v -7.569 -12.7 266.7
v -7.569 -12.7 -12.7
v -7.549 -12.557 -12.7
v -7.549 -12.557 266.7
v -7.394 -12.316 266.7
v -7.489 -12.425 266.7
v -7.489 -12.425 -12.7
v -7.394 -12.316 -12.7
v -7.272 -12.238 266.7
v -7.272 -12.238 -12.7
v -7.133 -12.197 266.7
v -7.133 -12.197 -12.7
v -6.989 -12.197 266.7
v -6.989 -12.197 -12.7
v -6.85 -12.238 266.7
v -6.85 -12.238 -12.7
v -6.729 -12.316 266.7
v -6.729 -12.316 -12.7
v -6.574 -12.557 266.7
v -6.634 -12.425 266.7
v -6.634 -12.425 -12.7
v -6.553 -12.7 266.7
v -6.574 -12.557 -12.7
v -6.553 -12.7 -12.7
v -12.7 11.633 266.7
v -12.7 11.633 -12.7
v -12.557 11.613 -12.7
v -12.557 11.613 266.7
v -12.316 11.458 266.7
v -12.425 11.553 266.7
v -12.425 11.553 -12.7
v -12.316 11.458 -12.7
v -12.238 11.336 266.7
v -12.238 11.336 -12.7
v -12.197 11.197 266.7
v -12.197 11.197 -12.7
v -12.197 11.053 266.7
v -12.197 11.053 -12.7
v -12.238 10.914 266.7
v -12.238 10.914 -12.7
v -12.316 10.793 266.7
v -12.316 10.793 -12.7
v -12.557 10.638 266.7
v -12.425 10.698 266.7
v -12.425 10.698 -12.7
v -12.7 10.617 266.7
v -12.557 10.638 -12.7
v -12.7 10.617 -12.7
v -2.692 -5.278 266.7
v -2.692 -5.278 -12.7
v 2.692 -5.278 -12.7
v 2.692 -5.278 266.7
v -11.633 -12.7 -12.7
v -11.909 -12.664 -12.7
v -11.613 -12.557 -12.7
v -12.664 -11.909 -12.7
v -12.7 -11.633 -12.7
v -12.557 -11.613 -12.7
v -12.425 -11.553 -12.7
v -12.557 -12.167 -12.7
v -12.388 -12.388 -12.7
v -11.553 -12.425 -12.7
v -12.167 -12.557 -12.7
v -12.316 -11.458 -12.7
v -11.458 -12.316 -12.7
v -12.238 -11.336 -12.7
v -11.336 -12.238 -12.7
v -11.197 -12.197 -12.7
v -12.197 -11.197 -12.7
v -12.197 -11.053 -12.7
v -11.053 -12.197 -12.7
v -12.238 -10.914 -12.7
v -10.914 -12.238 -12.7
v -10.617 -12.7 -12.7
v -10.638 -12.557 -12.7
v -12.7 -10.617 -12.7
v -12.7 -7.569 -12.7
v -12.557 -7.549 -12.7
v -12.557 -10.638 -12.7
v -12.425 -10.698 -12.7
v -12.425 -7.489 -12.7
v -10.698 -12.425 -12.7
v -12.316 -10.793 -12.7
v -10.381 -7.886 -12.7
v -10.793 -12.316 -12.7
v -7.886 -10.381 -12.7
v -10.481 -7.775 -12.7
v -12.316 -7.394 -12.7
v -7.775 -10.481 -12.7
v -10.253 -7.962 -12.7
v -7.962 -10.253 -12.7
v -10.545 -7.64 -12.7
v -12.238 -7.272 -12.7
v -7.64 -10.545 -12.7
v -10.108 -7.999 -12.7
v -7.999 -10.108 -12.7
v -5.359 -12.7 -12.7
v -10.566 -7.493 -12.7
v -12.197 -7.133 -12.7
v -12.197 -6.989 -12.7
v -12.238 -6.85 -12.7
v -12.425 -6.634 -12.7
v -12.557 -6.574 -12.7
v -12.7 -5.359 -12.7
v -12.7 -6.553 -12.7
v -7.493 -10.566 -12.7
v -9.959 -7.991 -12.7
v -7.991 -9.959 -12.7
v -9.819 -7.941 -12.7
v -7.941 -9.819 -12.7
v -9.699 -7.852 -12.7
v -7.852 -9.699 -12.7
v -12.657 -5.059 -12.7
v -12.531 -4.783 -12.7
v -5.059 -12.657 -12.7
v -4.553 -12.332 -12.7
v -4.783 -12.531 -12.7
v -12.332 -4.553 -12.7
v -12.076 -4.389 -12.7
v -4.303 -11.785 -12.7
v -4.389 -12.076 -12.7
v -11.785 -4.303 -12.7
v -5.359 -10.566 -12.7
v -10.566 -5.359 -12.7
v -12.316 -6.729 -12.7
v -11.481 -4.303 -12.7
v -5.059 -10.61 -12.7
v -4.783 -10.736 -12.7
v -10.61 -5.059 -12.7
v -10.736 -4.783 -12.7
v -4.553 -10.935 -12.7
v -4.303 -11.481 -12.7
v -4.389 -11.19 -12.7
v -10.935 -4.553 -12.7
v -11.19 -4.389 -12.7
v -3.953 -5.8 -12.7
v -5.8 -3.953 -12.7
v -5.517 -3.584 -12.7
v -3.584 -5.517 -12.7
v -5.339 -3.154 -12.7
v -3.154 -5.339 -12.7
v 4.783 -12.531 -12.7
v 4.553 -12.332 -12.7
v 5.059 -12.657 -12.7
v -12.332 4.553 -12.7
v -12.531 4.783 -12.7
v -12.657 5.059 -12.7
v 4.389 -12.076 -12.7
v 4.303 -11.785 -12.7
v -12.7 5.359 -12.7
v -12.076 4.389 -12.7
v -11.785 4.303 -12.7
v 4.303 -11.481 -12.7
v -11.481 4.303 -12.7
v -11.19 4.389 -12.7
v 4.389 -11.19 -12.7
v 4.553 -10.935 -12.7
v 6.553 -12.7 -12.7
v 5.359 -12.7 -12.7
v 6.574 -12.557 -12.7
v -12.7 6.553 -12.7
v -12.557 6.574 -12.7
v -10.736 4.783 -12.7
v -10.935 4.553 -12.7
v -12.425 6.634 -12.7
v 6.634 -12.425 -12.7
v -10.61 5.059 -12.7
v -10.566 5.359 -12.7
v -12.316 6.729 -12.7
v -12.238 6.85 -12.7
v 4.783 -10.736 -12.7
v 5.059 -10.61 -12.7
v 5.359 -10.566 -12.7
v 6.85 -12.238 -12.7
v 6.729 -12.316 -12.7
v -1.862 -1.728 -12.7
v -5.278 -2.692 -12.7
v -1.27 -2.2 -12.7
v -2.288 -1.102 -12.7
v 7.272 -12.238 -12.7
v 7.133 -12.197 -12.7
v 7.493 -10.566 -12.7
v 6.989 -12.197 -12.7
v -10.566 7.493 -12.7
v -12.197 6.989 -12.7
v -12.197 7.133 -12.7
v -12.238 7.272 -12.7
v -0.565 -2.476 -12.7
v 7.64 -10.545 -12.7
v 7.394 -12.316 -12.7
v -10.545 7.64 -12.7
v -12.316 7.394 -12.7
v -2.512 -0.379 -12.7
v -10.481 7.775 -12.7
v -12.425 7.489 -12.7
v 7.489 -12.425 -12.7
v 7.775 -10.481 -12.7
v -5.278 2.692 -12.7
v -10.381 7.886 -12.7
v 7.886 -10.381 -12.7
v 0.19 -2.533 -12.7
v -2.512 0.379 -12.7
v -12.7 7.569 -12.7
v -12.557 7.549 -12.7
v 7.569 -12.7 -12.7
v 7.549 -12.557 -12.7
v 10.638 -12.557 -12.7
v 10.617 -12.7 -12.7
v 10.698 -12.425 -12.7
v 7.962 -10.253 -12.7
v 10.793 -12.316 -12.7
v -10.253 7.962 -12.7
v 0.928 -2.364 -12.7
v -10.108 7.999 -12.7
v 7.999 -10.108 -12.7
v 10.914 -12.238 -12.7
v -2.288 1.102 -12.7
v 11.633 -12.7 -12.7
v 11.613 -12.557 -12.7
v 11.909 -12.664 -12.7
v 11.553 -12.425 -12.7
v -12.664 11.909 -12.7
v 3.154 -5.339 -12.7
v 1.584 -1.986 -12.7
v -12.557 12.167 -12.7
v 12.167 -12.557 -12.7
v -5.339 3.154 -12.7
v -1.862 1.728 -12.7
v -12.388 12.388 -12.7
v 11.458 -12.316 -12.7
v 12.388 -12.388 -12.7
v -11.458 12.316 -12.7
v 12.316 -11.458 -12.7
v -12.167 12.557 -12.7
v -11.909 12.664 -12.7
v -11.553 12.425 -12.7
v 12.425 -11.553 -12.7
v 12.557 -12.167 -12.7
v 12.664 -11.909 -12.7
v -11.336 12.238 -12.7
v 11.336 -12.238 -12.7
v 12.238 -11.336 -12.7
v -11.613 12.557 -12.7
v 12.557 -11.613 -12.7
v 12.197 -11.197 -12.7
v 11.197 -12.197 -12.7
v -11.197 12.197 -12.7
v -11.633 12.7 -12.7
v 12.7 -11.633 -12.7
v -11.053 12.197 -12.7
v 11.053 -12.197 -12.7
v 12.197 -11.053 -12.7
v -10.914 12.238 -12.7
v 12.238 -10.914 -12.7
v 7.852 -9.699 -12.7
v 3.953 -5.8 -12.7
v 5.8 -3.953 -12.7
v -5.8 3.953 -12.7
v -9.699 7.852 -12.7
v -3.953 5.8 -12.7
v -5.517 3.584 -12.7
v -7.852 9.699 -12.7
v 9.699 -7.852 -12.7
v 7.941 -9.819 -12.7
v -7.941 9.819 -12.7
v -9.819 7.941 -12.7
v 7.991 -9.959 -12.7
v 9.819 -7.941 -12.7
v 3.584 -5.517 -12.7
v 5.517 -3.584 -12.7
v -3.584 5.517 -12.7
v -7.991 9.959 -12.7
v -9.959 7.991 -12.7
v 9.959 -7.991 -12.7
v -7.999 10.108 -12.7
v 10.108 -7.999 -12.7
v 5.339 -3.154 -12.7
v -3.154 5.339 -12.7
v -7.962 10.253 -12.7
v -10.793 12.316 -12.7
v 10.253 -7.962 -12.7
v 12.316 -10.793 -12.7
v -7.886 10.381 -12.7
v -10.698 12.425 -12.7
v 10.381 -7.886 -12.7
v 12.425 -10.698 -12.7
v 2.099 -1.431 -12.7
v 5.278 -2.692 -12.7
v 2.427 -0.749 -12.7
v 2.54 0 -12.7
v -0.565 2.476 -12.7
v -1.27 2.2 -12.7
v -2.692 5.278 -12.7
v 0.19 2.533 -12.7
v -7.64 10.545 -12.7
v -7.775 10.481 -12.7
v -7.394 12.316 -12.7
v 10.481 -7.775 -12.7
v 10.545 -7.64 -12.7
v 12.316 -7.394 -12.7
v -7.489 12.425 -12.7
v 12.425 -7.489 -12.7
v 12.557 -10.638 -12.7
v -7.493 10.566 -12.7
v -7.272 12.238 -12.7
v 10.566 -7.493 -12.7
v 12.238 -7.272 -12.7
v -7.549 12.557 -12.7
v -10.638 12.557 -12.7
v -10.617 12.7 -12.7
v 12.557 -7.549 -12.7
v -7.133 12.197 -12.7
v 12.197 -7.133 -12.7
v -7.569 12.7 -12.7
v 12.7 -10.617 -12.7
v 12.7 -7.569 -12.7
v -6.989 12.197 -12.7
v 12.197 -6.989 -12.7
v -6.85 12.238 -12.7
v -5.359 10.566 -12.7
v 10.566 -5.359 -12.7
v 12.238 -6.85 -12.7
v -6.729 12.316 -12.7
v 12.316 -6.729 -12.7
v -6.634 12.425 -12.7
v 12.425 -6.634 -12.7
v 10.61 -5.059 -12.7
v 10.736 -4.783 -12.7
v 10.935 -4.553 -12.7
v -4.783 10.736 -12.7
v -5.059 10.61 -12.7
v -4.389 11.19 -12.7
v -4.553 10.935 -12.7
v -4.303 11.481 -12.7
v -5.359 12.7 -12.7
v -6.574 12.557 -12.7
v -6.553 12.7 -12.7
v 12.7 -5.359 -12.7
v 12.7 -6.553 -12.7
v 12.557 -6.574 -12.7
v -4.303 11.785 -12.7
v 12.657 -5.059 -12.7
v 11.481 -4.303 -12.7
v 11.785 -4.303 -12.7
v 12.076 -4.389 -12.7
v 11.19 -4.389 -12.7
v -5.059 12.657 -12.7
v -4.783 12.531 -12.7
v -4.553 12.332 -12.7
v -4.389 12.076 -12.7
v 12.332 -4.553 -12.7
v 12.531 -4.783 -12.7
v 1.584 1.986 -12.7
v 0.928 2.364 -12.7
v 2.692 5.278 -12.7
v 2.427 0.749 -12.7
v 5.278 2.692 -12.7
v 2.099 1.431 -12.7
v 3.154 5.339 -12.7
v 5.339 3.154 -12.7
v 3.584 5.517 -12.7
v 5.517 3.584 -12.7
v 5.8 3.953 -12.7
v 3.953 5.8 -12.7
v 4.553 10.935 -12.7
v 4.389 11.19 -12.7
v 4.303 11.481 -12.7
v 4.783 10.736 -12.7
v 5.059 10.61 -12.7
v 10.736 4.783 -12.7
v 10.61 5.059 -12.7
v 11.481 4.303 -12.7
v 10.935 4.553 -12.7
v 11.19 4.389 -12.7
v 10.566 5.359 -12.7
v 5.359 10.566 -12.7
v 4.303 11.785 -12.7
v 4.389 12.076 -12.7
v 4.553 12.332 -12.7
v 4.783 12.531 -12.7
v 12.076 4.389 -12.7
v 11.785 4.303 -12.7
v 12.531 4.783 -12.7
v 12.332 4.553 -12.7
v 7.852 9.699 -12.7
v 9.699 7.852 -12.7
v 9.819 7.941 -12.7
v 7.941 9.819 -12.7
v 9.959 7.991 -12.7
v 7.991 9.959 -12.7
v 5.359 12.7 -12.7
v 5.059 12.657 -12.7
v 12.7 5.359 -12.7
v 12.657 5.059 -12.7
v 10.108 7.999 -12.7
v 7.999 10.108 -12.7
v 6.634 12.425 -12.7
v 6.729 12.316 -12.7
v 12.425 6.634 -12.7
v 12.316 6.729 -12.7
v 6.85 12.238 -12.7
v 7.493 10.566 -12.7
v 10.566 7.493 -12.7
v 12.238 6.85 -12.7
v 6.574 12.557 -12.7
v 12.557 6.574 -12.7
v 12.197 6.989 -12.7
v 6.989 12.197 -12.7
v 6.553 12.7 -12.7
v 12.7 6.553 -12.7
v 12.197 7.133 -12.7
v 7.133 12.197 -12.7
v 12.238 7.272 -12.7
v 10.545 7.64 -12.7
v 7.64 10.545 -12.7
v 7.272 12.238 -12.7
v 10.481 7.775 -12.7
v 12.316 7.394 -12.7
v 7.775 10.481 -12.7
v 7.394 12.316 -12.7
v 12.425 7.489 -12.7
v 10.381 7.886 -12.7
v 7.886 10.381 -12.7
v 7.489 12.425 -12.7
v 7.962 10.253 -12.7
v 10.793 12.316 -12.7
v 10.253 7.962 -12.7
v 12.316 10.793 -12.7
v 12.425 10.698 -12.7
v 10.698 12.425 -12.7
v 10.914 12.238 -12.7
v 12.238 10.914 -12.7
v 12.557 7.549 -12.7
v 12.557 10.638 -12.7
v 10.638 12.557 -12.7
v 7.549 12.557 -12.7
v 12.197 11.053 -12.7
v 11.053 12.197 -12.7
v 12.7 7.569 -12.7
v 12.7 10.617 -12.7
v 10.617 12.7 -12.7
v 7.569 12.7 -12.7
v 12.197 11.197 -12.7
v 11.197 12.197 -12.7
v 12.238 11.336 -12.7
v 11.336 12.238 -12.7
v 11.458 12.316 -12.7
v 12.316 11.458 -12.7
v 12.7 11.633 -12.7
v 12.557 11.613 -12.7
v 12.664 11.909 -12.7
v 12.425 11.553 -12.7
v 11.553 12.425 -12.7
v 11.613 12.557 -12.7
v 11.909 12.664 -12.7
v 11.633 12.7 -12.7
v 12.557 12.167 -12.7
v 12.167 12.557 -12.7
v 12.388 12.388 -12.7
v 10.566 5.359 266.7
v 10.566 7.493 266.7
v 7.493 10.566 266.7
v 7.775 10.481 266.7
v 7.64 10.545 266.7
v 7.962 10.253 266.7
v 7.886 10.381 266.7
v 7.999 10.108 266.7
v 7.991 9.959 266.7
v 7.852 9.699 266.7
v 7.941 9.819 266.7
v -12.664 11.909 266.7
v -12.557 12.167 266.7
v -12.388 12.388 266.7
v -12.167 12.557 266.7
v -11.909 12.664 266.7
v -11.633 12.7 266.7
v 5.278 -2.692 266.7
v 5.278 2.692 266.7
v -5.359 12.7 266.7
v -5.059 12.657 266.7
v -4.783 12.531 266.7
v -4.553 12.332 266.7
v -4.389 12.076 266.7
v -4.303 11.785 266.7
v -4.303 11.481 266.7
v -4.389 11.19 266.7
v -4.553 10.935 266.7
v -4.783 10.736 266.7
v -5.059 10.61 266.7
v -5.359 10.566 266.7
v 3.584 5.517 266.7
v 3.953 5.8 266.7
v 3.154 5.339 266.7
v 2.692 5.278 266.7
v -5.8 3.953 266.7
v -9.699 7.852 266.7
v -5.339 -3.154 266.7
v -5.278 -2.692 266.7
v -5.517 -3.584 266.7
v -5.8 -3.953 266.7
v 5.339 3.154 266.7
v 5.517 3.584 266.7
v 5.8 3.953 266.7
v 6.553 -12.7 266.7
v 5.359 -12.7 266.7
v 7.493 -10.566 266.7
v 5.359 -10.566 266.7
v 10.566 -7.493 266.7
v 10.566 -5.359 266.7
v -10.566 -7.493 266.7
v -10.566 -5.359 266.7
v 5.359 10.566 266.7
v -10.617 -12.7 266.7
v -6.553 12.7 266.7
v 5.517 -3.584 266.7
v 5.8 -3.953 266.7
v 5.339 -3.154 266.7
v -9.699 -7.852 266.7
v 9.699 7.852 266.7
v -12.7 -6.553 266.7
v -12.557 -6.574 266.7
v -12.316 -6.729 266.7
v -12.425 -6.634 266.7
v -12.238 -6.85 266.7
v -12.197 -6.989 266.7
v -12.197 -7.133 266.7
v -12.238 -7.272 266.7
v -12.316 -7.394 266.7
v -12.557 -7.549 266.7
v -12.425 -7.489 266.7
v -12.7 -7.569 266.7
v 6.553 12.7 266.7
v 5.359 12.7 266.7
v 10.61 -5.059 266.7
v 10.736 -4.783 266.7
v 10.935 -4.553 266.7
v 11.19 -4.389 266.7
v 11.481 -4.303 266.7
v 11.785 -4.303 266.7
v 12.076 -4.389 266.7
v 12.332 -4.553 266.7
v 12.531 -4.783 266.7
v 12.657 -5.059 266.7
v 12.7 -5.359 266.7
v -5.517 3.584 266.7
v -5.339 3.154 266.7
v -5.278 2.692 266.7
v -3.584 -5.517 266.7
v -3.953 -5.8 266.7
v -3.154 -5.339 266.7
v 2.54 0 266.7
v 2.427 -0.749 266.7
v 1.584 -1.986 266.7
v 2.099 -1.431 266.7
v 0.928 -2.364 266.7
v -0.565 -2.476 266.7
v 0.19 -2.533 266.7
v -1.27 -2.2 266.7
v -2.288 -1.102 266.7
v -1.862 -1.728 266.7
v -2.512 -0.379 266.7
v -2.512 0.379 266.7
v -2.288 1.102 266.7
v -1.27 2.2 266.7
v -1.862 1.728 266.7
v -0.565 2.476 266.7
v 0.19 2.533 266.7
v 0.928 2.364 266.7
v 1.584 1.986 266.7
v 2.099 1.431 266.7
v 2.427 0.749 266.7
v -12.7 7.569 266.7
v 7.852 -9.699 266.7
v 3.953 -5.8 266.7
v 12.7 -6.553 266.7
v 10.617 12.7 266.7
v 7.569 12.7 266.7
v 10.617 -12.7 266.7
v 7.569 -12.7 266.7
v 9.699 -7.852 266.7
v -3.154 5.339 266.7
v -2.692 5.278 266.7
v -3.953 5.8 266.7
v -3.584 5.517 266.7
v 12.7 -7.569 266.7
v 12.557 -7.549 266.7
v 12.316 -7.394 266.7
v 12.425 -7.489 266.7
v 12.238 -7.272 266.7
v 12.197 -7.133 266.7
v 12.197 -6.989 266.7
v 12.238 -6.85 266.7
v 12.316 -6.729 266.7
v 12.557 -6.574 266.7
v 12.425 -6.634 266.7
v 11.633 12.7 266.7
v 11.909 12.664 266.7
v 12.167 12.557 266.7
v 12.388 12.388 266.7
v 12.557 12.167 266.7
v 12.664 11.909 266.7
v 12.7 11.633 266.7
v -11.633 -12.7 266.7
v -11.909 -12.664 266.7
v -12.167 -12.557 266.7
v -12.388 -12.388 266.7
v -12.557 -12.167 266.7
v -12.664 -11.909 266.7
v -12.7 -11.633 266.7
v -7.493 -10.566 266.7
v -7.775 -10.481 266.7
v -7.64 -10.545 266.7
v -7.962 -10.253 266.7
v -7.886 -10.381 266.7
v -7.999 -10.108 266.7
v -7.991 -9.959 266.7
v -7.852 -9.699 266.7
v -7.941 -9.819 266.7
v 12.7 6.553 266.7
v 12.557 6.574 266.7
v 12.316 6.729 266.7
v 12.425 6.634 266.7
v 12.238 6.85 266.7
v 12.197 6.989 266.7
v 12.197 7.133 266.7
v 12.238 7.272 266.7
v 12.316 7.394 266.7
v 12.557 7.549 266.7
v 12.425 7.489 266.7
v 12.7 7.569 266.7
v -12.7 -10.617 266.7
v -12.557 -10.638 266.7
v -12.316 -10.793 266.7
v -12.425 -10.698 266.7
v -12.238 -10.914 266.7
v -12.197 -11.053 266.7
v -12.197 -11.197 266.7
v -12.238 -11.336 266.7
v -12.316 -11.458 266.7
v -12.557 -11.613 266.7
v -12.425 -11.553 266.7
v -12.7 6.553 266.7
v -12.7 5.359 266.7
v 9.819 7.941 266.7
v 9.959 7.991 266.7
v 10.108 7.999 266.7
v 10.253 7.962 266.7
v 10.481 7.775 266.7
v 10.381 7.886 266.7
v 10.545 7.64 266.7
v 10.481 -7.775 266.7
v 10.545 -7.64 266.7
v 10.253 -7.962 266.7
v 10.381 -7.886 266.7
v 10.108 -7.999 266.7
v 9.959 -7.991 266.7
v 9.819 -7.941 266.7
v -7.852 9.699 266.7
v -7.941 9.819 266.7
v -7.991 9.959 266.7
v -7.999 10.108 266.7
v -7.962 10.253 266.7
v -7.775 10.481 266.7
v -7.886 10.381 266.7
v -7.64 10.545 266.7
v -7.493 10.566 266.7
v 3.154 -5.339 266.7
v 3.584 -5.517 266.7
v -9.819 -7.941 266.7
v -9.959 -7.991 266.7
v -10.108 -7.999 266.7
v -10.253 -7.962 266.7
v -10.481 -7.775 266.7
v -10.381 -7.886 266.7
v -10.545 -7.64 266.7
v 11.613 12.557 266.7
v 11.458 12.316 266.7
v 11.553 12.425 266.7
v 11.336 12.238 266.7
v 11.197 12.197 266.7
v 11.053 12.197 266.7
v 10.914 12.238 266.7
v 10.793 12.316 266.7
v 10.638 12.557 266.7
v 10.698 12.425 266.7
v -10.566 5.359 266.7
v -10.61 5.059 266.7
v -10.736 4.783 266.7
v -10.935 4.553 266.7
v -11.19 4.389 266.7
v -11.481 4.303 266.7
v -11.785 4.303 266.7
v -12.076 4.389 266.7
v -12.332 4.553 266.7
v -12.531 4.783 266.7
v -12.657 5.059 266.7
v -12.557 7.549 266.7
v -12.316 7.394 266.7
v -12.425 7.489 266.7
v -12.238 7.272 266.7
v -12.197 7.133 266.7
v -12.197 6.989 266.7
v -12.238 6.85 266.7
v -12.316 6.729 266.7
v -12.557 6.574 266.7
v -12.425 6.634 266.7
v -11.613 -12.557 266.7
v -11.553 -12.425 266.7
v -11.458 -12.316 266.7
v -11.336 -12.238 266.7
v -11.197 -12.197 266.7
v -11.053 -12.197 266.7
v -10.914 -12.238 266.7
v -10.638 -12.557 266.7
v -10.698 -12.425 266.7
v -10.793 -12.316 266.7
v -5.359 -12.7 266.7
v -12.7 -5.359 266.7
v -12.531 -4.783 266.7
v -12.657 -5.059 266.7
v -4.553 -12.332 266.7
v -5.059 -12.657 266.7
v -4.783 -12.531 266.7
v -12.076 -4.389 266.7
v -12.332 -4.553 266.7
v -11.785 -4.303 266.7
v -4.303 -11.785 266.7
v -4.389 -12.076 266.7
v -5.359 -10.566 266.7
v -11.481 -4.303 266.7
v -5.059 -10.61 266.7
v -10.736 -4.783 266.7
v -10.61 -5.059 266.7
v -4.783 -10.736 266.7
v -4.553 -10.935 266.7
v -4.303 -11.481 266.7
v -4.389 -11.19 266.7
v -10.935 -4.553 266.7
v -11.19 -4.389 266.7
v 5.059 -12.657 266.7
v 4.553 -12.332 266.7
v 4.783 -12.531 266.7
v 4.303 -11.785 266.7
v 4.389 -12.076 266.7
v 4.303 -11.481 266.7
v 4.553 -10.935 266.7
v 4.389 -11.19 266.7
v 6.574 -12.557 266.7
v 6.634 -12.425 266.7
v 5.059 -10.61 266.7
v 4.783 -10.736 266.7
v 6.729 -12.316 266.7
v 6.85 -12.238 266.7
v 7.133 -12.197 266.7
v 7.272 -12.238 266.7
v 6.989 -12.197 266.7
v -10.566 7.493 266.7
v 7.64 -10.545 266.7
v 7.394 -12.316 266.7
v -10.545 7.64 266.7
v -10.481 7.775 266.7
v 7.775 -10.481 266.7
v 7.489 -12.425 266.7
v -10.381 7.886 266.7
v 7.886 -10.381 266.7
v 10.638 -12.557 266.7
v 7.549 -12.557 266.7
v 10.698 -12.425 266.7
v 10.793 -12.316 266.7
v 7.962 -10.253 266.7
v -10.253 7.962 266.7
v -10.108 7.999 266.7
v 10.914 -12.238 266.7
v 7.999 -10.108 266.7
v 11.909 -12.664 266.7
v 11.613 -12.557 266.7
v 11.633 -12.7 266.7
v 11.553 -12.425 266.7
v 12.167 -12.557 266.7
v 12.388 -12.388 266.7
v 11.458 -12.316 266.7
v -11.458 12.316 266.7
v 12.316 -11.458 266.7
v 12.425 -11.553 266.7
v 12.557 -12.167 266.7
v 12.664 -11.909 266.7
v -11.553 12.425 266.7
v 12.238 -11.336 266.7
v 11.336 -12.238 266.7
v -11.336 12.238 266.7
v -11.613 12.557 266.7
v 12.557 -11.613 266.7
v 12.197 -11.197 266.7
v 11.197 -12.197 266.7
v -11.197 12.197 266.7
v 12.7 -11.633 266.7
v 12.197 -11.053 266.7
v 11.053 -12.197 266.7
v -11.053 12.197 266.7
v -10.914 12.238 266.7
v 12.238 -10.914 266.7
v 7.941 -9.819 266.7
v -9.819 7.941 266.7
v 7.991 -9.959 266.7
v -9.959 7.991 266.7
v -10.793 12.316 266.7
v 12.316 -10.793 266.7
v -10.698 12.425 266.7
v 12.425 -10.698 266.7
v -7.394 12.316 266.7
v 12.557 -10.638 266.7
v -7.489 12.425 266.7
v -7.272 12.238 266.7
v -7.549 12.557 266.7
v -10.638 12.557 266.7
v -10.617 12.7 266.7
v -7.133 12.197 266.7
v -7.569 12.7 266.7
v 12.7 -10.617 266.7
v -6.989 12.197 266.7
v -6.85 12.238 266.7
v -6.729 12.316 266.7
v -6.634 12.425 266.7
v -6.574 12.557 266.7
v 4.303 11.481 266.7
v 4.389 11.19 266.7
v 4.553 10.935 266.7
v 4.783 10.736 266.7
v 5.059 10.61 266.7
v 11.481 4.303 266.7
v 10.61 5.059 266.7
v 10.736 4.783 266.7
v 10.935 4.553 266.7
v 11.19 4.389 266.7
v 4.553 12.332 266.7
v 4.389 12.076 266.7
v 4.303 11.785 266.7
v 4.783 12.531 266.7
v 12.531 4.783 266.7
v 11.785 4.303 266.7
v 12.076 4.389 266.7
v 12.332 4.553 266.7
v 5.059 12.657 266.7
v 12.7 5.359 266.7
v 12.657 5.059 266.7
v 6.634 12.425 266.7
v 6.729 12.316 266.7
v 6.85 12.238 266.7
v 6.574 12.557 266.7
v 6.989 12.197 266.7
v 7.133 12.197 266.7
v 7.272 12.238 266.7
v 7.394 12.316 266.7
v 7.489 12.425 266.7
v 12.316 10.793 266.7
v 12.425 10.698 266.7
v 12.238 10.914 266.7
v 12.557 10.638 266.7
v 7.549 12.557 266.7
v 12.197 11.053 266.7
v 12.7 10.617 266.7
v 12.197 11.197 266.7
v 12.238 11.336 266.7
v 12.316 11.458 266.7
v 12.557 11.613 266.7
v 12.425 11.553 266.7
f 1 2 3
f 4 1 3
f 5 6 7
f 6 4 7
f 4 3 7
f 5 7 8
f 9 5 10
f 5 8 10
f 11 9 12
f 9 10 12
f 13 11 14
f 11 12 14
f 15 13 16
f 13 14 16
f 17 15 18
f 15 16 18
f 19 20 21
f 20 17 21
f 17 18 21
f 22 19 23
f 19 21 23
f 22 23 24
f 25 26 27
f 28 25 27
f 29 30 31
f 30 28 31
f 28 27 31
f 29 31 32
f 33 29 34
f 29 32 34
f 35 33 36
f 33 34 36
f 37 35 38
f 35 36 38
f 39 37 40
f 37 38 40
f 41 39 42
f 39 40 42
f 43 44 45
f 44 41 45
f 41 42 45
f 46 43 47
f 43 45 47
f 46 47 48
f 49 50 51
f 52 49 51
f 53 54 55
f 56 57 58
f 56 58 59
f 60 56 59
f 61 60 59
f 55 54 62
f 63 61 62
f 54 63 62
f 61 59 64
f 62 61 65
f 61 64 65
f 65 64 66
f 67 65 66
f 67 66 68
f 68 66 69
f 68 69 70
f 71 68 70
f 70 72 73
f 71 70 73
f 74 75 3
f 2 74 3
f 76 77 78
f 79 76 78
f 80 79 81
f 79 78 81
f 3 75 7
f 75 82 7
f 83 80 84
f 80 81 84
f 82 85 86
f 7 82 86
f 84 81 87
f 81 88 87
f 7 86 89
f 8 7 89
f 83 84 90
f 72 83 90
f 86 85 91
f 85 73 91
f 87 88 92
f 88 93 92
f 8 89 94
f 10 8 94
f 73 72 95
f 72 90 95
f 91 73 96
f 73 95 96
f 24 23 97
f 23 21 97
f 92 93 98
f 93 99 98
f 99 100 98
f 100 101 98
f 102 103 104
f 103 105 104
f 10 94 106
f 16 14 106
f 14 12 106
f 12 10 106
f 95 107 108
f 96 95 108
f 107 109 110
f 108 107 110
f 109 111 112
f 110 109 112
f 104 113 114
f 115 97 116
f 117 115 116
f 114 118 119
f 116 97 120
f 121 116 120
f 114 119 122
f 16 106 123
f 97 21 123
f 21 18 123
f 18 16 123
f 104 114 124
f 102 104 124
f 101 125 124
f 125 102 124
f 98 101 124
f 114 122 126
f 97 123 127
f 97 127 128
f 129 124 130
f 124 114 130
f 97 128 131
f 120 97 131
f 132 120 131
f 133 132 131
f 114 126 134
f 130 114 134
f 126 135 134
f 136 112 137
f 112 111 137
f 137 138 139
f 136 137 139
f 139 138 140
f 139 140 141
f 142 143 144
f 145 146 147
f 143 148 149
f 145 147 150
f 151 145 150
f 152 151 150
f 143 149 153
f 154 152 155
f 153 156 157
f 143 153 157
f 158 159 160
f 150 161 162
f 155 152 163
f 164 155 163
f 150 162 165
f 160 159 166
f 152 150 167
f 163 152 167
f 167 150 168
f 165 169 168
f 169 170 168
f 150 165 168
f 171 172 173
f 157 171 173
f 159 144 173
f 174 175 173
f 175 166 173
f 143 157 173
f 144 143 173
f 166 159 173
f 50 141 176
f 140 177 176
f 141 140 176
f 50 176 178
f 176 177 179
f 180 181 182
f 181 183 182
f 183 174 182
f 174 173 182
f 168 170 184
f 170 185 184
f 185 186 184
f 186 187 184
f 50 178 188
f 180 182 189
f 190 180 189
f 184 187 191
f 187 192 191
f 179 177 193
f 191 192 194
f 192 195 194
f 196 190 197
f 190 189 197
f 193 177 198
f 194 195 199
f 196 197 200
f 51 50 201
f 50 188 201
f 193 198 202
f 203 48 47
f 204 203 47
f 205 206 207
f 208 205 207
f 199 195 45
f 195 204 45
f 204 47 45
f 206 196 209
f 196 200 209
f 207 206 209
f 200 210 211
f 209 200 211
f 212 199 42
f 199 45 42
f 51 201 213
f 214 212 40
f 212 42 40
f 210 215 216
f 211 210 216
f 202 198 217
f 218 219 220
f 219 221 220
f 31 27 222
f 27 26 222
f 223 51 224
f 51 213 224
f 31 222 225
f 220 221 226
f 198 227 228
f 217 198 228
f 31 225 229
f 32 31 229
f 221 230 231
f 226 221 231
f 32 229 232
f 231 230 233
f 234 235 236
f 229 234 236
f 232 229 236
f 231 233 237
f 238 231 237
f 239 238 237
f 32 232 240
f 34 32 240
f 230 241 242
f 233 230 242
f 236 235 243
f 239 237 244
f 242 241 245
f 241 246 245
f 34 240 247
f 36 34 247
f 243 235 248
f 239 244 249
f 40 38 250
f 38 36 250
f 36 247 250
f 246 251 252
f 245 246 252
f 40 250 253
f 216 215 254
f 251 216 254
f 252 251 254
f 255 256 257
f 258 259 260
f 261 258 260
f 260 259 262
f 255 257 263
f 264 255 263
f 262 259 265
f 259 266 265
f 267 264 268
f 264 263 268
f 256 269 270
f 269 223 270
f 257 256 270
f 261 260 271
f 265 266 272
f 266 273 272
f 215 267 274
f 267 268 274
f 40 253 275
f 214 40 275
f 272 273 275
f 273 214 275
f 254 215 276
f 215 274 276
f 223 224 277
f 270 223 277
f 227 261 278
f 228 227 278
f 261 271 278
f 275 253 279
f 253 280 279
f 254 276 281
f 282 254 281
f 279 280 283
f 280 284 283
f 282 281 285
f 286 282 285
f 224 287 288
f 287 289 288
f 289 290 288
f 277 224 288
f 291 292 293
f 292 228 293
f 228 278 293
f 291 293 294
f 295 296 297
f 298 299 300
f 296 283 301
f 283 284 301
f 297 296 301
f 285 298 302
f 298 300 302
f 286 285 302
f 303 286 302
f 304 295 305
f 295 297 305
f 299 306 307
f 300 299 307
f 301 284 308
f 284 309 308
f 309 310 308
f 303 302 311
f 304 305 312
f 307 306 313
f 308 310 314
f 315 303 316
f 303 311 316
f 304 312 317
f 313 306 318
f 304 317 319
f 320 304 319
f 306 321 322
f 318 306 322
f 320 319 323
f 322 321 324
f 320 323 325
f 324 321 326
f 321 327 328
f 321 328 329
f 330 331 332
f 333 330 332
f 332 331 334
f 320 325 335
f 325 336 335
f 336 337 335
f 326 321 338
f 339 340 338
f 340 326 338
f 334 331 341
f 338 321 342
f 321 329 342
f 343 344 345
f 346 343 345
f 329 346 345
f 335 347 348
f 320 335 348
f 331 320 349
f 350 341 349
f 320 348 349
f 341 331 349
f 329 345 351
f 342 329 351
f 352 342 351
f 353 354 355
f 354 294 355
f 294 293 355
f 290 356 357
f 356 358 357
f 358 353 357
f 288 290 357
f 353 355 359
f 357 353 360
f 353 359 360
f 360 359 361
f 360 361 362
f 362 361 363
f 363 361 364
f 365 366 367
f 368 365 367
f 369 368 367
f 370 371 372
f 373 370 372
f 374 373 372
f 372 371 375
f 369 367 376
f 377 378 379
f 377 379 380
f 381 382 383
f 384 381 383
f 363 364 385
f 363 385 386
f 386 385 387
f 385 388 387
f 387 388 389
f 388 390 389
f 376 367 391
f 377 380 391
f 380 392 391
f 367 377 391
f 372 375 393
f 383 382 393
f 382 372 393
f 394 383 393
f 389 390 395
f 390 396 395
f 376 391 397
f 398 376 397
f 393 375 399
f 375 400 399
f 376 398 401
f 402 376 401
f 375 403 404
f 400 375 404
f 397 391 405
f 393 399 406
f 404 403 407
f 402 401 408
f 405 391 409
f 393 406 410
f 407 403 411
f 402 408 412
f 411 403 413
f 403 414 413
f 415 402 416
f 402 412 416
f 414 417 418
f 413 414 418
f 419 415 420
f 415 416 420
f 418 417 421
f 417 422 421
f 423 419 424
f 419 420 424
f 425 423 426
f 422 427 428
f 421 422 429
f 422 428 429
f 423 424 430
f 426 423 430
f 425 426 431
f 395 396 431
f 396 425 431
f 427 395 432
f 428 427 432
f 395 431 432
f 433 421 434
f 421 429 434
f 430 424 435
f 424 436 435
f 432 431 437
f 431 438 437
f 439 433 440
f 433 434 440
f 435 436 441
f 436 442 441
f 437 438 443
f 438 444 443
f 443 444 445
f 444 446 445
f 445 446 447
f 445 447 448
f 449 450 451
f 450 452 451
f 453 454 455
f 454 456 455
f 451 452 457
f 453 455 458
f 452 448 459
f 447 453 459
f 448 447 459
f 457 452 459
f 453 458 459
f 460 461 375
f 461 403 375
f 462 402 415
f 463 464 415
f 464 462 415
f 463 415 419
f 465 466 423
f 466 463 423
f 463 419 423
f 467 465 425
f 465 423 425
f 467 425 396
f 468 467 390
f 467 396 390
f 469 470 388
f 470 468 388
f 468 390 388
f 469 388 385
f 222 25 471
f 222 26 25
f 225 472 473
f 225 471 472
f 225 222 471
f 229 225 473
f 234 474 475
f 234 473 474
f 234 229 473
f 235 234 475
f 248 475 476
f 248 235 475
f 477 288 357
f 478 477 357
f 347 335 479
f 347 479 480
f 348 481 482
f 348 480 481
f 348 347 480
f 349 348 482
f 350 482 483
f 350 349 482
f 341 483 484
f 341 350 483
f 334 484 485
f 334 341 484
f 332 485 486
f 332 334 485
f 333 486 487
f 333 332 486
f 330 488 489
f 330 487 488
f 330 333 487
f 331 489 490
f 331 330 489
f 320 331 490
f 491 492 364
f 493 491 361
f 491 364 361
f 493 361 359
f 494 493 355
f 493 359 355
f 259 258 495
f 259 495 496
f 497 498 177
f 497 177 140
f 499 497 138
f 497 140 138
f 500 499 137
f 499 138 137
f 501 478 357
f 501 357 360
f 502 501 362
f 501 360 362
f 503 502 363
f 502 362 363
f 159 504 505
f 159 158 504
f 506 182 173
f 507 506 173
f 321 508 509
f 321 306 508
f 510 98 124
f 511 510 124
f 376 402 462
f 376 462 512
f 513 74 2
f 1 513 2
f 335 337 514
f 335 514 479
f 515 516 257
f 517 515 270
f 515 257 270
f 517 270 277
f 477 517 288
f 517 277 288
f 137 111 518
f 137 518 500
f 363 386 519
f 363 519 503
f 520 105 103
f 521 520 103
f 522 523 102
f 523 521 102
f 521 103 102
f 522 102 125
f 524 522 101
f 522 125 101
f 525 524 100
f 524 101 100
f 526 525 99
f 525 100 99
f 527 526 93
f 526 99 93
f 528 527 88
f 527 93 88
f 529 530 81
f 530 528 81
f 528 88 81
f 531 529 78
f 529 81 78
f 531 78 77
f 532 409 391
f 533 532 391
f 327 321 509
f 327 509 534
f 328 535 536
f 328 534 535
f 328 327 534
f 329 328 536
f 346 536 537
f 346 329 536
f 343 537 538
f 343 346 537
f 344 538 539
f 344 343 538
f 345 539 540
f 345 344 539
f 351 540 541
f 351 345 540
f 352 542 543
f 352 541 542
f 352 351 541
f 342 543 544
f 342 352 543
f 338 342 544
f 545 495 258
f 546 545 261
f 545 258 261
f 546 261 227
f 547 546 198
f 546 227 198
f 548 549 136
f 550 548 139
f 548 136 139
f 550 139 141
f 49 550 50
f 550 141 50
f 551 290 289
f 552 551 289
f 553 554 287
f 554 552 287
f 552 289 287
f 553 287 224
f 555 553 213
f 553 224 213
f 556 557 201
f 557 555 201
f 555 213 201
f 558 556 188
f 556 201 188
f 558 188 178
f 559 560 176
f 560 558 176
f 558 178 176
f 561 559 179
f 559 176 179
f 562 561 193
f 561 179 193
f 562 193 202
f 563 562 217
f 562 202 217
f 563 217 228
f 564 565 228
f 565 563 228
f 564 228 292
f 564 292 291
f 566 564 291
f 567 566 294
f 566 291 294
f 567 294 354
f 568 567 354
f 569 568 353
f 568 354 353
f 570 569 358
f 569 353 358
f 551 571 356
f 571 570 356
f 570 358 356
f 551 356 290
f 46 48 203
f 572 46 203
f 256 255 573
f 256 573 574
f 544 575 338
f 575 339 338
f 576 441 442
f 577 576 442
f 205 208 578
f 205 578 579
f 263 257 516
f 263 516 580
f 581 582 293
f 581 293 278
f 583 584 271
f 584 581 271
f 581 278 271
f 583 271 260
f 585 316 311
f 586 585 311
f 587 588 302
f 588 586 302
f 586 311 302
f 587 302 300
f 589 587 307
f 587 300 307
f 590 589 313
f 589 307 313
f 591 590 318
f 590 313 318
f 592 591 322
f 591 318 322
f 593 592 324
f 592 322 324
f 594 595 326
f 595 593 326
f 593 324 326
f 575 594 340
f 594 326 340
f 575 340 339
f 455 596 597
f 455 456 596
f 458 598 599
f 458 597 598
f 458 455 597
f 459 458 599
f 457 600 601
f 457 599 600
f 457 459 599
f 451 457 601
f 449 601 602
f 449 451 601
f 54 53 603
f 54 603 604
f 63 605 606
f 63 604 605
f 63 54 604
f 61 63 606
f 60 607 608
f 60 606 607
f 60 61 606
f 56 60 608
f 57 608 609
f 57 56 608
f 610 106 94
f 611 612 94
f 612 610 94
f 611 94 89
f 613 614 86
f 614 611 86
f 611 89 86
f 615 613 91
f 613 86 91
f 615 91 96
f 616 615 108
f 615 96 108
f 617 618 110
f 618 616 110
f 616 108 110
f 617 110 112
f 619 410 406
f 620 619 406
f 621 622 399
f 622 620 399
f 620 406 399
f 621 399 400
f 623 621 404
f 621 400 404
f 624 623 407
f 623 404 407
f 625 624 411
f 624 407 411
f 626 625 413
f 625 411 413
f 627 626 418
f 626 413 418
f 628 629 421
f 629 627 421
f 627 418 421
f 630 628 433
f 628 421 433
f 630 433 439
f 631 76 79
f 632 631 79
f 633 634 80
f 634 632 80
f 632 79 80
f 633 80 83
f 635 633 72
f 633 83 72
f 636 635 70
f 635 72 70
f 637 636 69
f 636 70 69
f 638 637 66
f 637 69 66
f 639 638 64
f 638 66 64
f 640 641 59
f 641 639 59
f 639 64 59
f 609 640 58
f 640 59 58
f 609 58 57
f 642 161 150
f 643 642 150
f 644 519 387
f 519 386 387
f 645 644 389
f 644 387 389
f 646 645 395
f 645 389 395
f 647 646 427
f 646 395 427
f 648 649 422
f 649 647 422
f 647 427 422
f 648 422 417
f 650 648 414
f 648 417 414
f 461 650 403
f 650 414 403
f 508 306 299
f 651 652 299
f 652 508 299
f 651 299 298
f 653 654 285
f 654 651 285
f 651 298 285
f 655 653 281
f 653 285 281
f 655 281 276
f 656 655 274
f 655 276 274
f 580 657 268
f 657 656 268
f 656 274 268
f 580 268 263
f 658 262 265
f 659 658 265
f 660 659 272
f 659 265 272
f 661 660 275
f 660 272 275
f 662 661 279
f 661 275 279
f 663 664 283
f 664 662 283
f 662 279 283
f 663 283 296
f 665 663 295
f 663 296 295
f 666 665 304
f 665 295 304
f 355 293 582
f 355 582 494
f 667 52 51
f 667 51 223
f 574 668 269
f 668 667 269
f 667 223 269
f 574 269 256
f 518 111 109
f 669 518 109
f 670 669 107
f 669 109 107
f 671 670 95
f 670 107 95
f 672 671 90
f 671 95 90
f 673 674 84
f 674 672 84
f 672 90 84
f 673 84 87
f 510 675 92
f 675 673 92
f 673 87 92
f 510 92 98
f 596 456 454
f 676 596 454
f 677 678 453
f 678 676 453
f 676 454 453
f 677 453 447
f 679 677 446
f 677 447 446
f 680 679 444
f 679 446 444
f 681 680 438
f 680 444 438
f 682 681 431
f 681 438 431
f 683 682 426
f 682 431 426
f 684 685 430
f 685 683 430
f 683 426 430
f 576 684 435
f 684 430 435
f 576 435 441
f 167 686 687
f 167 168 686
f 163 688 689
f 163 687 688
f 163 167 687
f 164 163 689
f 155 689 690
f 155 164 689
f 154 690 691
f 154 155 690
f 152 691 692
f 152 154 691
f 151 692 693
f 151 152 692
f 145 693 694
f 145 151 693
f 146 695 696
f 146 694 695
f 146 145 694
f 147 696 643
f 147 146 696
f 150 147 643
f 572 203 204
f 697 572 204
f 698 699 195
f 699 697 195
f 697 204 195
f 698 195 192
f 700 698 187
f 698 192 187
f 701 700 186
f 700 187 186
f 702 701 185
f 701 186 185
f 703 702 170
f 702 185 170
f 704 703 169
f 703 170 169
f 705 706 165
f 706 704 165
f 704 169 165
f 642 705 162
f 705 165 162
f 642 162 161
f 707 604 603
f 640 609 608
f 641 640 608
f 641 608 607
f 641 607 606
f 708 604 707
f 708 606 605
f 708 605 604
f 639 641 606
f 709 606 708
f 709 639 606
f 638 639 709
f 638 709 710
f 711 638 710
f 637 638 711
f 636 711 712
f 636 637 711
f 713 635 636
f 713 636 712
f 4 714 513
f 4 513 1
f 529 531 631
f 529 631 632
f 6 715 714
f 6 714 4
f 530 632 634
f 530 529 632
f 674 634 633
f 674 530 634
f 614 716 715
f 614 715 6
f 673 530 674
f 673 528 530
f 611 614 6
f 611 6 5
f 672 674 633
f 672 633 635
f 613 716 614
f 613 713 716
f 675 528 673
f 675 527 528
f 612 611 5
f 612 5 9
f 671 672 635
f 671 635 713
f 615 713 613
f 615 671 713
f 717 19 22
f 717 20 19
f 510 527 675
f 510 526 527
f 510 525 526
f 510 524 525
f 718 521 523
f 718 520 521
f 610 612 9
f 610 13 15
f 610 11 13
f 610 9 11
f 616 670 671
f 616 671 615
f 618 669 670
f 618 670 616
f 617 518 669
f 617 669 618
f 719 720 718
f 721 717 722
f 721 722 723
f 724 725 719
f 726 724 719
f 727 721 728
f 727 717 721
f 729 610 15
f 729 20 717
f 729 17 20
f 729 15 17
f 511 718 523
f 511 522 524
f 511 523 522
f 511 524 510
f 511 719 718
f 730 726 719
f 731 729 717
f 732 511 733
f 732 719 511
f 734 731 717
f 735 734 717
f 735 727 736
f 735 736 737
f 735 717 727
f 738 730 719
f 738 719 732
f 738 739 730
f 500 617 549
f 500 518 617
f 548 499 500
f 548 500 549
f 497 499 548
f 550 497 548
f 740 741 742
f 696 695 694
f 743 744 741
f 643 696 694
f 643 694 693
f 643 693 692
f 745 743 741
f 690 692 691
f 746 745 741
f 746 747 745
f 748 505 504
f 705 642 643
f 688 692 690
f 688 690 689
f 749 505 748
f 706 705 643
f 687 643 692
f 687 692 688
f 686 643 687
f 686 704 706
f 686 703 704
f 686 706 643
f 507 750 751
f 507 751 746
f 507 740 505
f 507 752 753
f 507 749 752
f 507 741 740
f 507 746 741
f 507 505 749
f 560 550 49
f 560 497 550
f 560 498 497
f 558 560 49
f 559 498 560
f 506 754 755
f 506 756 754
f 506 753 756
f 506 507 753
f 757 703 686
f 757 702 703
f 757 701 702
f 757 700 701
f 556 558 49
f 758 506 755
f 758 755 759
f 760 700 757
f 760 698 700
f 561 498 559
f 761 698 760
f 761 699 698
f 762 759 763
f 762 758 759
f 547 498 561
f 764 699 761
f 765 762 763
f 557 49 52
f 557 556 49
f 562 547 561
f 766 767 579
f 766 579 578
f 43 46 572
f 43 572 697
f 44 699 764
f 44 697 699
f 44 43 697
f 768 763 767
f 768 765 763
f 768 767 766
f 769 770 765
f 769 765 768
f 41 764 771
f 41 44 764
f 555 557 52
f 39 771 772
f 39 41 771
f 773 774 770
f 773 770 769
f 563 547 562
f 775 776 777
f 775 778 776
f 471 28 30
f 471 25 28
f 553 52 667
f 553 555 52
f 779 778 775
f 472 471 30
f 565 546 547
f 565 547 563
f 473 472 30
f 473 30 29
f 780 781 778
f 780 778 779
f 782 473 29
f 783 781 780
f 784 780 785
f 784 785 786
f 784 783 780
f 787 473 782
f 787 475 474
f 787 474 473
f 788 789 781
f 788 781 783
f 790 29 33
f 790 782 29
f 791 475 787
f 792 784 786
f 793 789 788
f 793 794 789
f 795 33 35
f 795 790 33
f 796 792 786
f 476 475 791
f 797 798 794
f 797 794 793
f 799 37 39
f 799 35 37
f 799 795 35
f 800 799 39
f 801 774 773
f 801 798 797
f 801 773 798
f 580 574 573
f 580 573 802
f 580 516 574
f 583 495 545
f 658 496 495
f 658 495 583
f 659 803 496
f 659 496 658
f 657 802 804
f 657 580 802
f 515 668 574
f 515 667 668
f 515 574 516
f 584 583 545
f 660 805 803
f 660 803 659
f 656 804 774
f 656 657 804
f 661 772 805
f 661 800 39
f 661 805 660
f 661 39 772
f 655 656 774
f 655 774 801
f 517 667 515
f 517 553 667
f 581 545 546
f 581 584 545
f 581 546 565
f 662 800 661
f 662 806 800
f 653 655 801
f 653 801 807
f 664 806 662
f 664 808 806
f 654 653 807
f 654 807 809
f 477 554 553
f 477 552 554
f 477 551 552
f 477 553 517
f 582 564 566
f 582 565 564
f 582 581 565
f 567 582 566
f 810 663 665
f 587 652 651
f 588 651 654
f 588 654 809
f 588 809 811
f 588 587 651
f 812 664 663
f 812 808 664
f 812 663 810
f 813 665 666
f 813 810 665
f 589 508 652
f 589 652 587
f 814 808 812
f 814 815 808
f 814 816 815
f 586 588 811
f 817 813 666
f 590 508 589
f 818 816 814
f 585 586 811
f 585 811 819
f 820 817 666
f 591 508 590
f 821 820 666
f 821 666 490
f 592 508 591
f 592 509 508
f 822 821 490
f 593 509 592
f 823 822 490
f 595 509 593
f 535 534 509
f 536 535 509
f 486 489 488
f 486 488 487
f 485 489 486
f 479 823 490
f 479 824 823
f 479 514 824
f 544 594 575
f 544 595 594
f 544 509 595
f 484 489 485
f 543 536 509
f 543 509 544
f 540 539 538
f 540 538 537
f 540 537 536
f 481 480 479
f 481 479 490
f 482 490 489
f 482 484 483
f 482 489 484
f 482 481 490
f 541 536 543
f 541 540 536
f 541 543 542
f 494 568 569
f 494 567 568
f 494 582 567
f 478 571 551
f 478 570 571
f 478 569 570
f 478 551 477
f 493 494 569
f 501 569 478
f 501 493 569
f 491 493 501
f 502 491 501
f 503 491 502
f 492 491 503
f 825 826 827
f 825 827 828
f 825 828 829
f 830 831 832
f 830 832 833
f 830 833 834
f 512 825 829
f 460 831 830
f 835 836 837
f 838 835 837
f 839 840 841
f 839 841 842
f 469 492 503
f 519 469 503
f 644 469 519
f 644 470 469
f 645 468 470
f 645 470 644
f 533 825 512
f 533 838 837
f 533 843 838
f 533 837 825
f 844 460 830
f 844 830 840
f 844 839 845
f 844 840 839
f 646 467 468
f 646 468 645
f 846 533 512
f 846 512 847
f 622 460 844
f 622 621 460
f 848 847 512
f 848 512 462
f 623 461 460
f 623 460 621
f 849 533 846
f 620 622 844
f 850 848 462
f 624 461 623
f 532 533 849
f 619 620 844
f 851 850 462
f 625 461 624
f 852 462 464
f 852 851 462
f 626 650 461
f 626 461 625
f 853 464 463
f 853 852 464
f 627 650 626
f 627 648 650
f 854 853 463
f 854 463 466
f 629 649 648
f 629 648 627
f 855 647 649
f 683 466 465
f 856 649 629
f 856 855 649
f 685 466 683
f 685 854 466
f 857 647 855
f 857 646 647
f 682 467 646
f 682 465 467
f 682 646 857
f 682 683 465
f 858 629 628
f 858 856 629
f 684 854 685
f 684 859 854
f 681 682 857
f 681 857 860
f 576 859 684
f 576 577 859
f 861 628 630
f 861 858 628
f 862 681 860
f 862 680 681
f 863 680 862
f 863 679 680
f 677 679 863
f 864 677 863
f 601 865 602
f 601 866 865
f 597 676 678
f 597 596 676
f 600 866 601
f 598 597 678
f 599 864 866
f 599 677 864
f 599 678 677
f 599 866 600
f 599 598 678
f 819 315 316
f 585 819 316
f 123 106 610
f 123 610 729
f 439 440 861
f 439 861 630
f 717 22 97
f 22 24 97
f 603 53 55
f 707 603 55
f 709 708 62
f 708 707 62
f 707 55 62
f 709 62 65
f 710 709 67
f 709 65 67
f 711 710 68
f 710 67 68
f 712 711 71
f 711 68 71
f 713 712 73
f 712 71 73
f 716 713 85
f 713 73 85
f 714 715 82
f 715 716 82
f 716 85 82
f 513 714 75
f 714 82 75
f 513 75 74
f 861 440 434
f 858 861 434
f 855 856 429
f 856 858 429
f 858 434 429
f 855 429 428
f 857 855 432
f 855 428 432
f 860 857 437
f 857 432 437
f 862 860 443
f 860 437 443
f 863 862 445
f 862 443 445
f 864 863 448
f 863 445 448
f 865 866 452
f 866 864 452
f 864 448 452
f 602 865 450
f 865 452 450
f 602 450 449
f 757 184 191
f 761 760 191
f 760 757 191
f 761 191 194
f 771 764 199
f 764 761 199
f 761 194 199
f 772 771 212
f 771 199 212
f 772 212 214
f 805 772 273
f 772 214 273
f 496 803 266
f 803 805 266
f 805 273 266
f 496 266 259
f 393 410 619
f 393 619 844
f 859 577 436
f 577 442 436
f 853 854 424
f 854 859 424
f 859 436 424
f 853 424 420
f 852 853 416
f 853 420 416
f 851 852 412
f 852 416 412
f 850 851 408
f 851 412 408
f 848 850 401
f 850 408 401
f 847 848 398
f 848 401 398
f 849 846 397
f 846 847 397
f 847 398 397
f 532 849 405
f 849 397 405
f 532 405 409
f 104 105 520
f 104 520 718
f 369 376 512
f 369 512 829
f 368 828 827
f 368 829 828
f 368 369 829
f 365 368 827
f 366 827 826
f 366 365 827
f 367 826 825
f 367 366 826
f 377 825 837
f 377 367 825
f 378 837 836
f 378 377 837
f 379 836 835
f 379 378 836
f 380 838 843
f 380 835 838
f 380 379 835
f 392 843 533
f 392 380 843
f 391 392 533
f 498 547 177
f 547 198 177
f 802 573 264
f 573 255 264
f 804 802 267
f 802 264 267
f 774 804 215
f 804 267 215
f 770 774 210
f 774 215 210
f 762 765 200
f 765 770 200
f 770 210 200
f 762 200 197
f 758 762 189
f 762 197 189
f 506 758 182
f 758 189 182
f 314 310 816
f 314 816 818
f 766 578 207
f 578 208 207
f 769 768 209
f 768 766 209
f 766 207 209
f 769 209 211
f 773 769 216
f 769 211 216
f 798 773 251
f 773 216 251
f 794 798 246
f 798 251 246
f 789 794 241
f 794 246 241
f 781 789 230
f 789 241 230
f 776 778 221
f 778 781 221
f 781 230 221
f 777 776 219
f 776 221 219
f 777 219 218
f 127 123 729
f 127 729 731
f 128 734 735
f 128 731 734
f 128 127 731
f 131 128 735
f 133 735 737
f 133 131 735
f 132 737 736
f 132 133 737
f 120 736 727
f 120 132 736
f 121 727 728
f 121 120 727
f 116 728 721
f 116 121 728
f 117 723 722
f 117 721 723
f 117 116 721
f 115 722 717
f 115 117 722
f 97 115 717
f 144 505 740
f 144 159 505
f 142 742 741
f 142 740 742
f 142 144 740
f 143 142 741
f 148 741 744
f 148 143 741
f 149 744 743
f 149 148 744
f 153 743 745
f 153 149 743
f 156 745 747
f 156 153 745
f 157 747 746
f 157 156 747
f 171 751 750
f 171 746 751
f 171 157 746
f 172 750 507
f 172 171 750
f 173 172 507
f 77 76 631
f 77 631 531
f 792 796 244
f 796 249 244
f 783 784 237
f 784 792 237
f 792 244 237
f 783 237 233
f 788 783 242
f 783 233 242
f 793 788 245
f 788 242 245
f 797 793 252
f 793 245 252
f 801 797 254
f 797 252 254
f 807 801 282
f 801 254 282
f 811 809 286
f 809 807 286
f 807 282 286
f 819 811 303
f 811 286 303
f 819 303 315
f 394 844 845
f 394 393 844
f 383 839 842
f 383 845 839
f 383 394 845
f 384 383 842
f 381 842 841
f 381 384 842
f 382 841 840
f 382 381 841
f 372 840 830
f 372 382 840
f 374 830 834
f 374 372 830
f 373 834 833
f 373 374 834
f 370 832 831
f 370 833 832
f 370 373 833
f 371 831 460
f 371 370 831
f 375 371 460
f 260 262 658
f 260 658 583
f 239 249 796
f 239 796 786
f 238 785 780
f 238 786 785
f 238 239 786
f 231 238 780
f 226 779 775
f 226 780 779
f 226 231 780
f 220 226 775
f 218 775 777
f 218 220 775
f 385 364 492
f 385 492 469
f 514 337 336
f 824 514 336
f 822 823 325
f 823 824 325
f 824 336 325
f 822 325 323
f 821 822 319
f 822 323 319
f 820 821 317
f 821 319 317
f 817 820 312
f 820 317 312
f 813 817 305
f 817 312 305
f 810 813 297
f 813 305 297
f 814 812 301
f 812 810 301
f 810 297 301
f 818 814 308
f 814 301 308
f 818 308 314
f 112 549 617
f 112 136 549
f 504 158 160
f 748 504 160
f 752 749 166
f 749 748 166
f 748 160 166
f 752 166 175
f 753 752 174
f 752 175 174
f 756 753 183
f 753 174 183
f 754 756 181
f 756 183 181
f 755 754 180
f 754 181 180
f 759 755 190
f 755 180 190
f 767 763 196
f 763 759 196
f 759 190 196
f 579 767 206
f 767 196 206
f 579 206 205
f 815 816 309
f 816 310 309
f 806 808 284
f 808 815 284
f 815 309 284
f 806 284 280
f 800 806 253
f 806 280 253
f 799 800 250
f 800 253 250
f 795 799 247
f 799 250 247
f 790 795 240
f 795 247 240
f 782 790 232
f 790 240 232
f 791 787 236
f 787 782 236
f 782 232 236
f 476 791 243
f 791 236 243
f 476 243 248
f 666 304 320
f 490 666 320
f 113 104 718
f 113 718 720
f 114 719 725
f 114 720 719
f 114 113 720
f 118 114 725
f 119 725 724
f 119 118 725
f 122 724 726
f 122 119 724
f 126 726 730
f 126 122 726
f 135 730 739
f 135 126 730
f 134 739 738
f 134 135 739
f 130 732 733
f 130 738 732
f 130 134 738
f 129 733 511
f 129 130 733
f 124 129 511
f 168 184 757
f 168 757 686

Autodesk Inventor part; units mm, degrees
ref_plane "Start Plane" through (0, 0, -12.7) normal (0, 0, 1) x (1, 0, 0)
ref_plane "End Plane" through (0, 0, 266.7) normal (0, 0, 1) x (1, 0, 0)
sketch "Sketch" plane through (0, 0, 0) normal (0, 0, 1) x (1, 0, 0)
  arc A0 (-11.6332, 12.7) -> (-12.7, 11.6332) centre (-11.6332, 11.6332) ccw
  arc A1 (-5.3594, 10.5664) -> (-5.3594, 12.7) centre (-5.3594, 11.6332) ccw
  arc A2 (-12.7, 5.3594) -> (-10.5664, 5.3594) centre (-11.6332, 5.3594) ccw
  line L0 (-10.5664, 7.493) -> (-10.5664, 5.3594)
  line L1 (-7.493, 10.5664) -> (-5.3594, 10.5664)
  arc A3 (-9.6992, 7.8522) -> (-10.5664, 7.493) centre (-10.0584, 7.493) ccw
  arc A4 (-7.493, 10.5664) -> (-7.8522, 9.6992) centre (-7.493, 10.0584) ccw
  line L2 (-11.6332, 11.6332) -> (0, 0) construction
  line L3 (-5.8003, 3.9533) -> (-9.6992, 7.8522)
  line L4 (-7.8522, 9.6992) -> (-3.9533, 5.8003)
  arc A5 (-3.9533, 5.8003) -> (-2.6924, 5.278) centre (-2.6924, 7.0612) ccw
  arc A6 (-5.278, 2.6924) -> (-5.8003, 3.9533) centre (-7.0612, 2.6924) ccw
  arc A7 (0, 2.54) -> (-2.54, 0) centre (0, 0) ccw construction
  line L5 (0, 0) -> (-12.7, 0) construction
  line L6 (0, 12.7) -> (0, 0) construction
  arc A8 (-11.6332, 12.7) -> (-10.6172, 12.7) centre (-11.1252, 12.7) ccw
  arc A9 (-7.5692, 12.7) -> (-6.5532, 12.7) centre (-7.0612, 12.7) ccw
  arc A10 (-12.7, 10.6172) -> (-12.7, 11.6332) centre (-12.7, 11.1252) ccw
  arc A11 (-12.7, 6.5532) -> (-12.7, 7.5692) centre (-12.7, 7.0612) ccw
  line L7 (-12.7, 10.6172) -> (-12.7, 7.5692)
  line L8 (-12.7, 6.5532) -> (-12.7, 5.3594)
  line L9 (-10.6172, 12.7) -> (-7.5692, 12.7)
  line L10 (-6.5532, 12.7) -> (-5.3594, 12.7)
  circle A12 centre (0, 0) radius 2.54
  arc A13 (-12.7, -11.6332) -> (-11.6332, -12.7) centre (-11.6332, -11.6332) ccw
  line L11 (-12.7, -10.6172) -> (-12.7, -7.5692)
  arc A14 (-10.5664, -7.493) -> (-9.6992, -7.8522) centre (-10.0584, -7.493) ccw
  line L12 (-9.6992, -7.8522) -> (-5.8003, -3.9533)
  line L13 (-11.6332, -11.6332) -> (0, 0) construction
  line L14 (-3.9533, -5.8003) -> (-7.8522, -9.6992)
  arc A15 (-7.8522, -9.6992) -> (-7.493, -10.5664) centre (-7.493, -10.0584) ccw
  line L15 (-10.6172, -12.7) -> (-7.5692, -12.7)
  line L16 (-7.493, -10.5664) -> (-5.3594, -10.5664)
  arc A16 (-6.5532, -12.7) -> (-7.5692, -12.7) centre (-7.0612, -12.7) ccw
  line L17 (-6.5532, -12.7) -> (-5.3594, -12.7)
  arc A17 (-5.3594, -12.7) -> (-5.3594, -10.5664) centre (-5.3594, -11.6332) ccw
  arc A18 (-10.6172, -12.7) -> (-11.6332, -12.7) centre (-11.1252, -12.7) ccw
  arc A19 (-12.7, -11.6332) -> (-12.7, -10.6172) centre (-12.7, -11.1252) ccw
  arc A20 (-2.6924, -5.278) -> (-3.9533, -5.8003) centre (-2.6924, -7.0612) ccw
  arc A21 (-5.8003, -3.9533) -> (-5.278, -2.6924) centre (-7.0612, -2.6924) ccw
  line L18 (-10.5664, -7.493) -> (-10.5664, -5.3594)
  line L19 (-12.7, -6.5532) -> (-12.7, -5.3594)
  arc A22 (-10.5664, -5.3594) -> (-12.7, -5.3594) centre (-11.6332, -5.3594) ccw
  arc A23 (-12.7, -7.5692) -> (-12.7, -6.5532) centre (-12.7, -7.0612) ccw
  arc A24 (11.6332, -12.7) -> (12.7, -11.6332) centre (11.6332, -11.6332) ccw
  line L20 (10.6172, -12.7) -> (7.5692, -12.7)
  arc A25 (7.493, -10.5664) -> (7.8522, -9.6992) centre (7.493, -10.0584) ccw
  line L21 (7.8522, -9.6992) -> (3.9533, -5.8003)
  line L22 (11.6332, -11.6332) -> (0, 0) construction
  line L23 (5.8003, -3.9533) -> (9.6992, -7.8522)
  arc A26 (9.6992, -7.8522) -> (10.5664, -7.493) centre (10.0584, -7.493) ccw
  line L24 (12.7, -10.6172) -> (12.7, -7.5692)
  line L25 (10.5664, -7.493) -> (10.5664, -5.3594)
  arc A27 (12.7, -6.5532) -> (12.7, -7.5692) centre (12.7, -7.0612) ccw
  line L26 (12.7, -6.5532) -> (12.7, -5.3594)
  arc A28 (12.7, -5.3594) -> (10.5664, -5.3594) centre (11.6332, -5.3594) ccw
  arc A29 (12.7, -10.6172) -> (12.7, -11.6332) centre (12.7, -11.1252) ccw
  arc A30 (11.6332, -12.7) -> (10.6172, -12.7) centre (11.1252, -12.7) ccw
  arc A31 (5.278, -2.6924) -> (5.8003, -3.9533) centre (7.0612, -2.6924) ccw
  arc A32 (3.9533, -5.8003) -> (2.6924, -5.278) centre (2.6924, -7.0612) ccw
  line L27 (7.493, -10.5664) -> (5.3594, -10.5664)
  line L28 (6.5532, -12.7) -> (5.3594, -12.7)
  arc A33 (5.3594, -10.5664) -> (5.3594, -12.7) centre (5.3594, -11.6332) ccw
  arc A34 (7.5692, -12.7) -> (6.5532, -12.7) centre (7.0612, -12.7) ccw
  arc A35 (12.7, 11.6332) -> (11.6332, 12.7) centre (11.6332, 11.6332) ccw
  line L29 (12.7, 10.6172) -> (12.7, 7.5692)
  arc A36 (10.5664, 7.493) -> (9.6992, 7.8522) centre (10.0584, 7.493) ccw
  line L30 (9.6992, 7.8522) -> (5.8003, 3.9533)
  line L31 (11.6332, 11.6332) -> (0, 0) construction
  line L32 (3.9533, 5.8003) -> (7.8522, 9.6992)
  arc A37 (7.8522, 9.6992) -> (7.493, 10.5664) centre (7.493, 10.0584) ccw
  line L33 (10.6172, 12.7) -> (7.5692, 12.7)
  line L34 (7.493, 10.5664) -> (5.3594, 10.5664)
  arc A38 (6.5532, 12.7) -> (7.5692, 12.7) centre (7.0612, 12.7) ccw
  line L35 (6.5532, 12.7) -> (5.3594, 12.7)
  arc A39 (5.3594, 12.7) -> (5.3594, 10.5664) centre (5.3594, 11.6332) ccw
  arc A40 (10.6172, 12.7) -> (11.6332, 12.7) centre (11.1252, 12.7) ccw
  arc A41 (12.7, 11.6332) -> (12.7, 10.6172) centre (12.7, 11.1252) ccw
  arc A42 (2.6924, 5.278) -> (3.9533, 5.8003) centre (2.6924, 7.0612) ccw
  arc A43 (5.8003, 3.9533) -> (5.278, 2.6924) centre (7.0612, 2.6924) ccw
  line L36 (10.5664, 7.493) -> (10.5664, 5.3594)
  line L37 (12.7, 6.5532) -> (12.7, 5.3594)
  arc A44 (10.5664, 5.3594) -> (12.7, 5.3594) centre (11.6332, 5.3594) ccw
  arc A45 (12.7, 7.5692) -> (12.7, 6.5532) centre (12.7, 7.0612) ccw
  line L38 (-2.6924, 5.278) -> (2.6924, 5.278)
  line L39 (-5.278, 2.6924) -> (-5.278, -2.6924)
  line L40 (-2.6924, -5.278) -> (2.6924, -5.278)
  line L41 (5.278, -2.6924) -> (5.278, 2.6924)
  point P0 (0, 0)
  point P1 (0, 0)
  dimension "d2" = 2.1336
  dimension "d3" = 6.2738
  dimension "d4" = 6.2738
  dimension "d5" = 1.0668
  dimension "d6" = 2.1336
  dimension "d7" = 2.1336
  dimension "d8" = 1.016
  dimension "d9" = 1.016
  dimension "d10" = 135
  dimension "d11" = 2.667
  dimension "d12" = 4.572
  dimension "d13" = 4.572
  dimension "d14" = 2.667
  dimension "d15" = 5.08
  dimension "d16" = 45
  dimension "d19" = 45
  dimension "d20" = 0.508
  dimension "d21" = 4.572
  dimension "d22" = 1.016
  dimension "d23" = 4.572
  dimension "d24" = 1.016
  dimension "d25" = 0.508
  dimension "d26" = 0.508
  dimension "d27" = 0.508
  dimension "d28" = 12.7
  dimension "d37" = 360
  dimension "d47" = 10.5664
  dimension "d48" = 12.7
extrude "Body" add sketch "Sketch" along normal up to surface (279.4 mm away) from surface at -12.7
sketch "Sketch2" plane through (0, 0, 0) normal (0, 0, 1) x (1, 0, 0)
  line L0 (0, 0) -> (10, 0)
ref_plane "Work Plane3" through (0, 0, 0) normal (0, -1, 0) x (1, 0, 0)
sketch "Sketch3" plane through (0, 0, 0) normal (0, -1, 0) x (1, 0, 0)
  line L0 (-2, -12.7) -> (12, -12.7)
  line L1 (-2, 266.7) -> (12, 266.7)
  dimension "d60" = 279.4
ref_plane "Work Plane4" through (10.6172, 0, 266.7) normal (0, 0, 1) x (1, 0, 0)
split "Split1" plane through (10.6172, 0, 266.7) removes the side toward (0, 0, 1)
ref_plane "Work Plane5" through (0, -7.5692, -12.7) normal (0, 0, -1) x (-1, 0, 0)
split "Split2" plane through (0, -7.5692, -12.7) removes the side toward (0, 0, -1)
ref_plane "Work Plane6" through (-10.6172, -279.4, -12.7) normal (0, 0, -1) x (-1, 0, 0)
split "Split3" plane through (-10.6172, -279.4, -12.7) removes the side toward (0, 0, -1)
equation "\"d3\" = d4"
equation "\"d6\" = d7"
equation "\"d11\" = d14"
equation "\"d12\" = d13"
equation "\"d23\" = d21"
equation "\"d24\" = d30"
equation "\"d26\" = 0.5 * d24"
equation "\"d27\" = 0.5 * d22"
equation "\"Width\" = 2 * d28"
equation "\"Height\" = 2 * d48"
equation "\"G_OFFSET_START\" = 12.7"
equation "\"G_OFFSET_END\" = -12.7"
equation "\"d55\" = -G_OFFSET_START"
equation "\"d56\" = Length + G_OFFSET_END"
equation "\"G_L\" = 279.4"
equation "\"d30\" = 1.016"
equation "\"Length\" = 279.4"
properties part number "1010_80_20" material "Aluminum-6061"
